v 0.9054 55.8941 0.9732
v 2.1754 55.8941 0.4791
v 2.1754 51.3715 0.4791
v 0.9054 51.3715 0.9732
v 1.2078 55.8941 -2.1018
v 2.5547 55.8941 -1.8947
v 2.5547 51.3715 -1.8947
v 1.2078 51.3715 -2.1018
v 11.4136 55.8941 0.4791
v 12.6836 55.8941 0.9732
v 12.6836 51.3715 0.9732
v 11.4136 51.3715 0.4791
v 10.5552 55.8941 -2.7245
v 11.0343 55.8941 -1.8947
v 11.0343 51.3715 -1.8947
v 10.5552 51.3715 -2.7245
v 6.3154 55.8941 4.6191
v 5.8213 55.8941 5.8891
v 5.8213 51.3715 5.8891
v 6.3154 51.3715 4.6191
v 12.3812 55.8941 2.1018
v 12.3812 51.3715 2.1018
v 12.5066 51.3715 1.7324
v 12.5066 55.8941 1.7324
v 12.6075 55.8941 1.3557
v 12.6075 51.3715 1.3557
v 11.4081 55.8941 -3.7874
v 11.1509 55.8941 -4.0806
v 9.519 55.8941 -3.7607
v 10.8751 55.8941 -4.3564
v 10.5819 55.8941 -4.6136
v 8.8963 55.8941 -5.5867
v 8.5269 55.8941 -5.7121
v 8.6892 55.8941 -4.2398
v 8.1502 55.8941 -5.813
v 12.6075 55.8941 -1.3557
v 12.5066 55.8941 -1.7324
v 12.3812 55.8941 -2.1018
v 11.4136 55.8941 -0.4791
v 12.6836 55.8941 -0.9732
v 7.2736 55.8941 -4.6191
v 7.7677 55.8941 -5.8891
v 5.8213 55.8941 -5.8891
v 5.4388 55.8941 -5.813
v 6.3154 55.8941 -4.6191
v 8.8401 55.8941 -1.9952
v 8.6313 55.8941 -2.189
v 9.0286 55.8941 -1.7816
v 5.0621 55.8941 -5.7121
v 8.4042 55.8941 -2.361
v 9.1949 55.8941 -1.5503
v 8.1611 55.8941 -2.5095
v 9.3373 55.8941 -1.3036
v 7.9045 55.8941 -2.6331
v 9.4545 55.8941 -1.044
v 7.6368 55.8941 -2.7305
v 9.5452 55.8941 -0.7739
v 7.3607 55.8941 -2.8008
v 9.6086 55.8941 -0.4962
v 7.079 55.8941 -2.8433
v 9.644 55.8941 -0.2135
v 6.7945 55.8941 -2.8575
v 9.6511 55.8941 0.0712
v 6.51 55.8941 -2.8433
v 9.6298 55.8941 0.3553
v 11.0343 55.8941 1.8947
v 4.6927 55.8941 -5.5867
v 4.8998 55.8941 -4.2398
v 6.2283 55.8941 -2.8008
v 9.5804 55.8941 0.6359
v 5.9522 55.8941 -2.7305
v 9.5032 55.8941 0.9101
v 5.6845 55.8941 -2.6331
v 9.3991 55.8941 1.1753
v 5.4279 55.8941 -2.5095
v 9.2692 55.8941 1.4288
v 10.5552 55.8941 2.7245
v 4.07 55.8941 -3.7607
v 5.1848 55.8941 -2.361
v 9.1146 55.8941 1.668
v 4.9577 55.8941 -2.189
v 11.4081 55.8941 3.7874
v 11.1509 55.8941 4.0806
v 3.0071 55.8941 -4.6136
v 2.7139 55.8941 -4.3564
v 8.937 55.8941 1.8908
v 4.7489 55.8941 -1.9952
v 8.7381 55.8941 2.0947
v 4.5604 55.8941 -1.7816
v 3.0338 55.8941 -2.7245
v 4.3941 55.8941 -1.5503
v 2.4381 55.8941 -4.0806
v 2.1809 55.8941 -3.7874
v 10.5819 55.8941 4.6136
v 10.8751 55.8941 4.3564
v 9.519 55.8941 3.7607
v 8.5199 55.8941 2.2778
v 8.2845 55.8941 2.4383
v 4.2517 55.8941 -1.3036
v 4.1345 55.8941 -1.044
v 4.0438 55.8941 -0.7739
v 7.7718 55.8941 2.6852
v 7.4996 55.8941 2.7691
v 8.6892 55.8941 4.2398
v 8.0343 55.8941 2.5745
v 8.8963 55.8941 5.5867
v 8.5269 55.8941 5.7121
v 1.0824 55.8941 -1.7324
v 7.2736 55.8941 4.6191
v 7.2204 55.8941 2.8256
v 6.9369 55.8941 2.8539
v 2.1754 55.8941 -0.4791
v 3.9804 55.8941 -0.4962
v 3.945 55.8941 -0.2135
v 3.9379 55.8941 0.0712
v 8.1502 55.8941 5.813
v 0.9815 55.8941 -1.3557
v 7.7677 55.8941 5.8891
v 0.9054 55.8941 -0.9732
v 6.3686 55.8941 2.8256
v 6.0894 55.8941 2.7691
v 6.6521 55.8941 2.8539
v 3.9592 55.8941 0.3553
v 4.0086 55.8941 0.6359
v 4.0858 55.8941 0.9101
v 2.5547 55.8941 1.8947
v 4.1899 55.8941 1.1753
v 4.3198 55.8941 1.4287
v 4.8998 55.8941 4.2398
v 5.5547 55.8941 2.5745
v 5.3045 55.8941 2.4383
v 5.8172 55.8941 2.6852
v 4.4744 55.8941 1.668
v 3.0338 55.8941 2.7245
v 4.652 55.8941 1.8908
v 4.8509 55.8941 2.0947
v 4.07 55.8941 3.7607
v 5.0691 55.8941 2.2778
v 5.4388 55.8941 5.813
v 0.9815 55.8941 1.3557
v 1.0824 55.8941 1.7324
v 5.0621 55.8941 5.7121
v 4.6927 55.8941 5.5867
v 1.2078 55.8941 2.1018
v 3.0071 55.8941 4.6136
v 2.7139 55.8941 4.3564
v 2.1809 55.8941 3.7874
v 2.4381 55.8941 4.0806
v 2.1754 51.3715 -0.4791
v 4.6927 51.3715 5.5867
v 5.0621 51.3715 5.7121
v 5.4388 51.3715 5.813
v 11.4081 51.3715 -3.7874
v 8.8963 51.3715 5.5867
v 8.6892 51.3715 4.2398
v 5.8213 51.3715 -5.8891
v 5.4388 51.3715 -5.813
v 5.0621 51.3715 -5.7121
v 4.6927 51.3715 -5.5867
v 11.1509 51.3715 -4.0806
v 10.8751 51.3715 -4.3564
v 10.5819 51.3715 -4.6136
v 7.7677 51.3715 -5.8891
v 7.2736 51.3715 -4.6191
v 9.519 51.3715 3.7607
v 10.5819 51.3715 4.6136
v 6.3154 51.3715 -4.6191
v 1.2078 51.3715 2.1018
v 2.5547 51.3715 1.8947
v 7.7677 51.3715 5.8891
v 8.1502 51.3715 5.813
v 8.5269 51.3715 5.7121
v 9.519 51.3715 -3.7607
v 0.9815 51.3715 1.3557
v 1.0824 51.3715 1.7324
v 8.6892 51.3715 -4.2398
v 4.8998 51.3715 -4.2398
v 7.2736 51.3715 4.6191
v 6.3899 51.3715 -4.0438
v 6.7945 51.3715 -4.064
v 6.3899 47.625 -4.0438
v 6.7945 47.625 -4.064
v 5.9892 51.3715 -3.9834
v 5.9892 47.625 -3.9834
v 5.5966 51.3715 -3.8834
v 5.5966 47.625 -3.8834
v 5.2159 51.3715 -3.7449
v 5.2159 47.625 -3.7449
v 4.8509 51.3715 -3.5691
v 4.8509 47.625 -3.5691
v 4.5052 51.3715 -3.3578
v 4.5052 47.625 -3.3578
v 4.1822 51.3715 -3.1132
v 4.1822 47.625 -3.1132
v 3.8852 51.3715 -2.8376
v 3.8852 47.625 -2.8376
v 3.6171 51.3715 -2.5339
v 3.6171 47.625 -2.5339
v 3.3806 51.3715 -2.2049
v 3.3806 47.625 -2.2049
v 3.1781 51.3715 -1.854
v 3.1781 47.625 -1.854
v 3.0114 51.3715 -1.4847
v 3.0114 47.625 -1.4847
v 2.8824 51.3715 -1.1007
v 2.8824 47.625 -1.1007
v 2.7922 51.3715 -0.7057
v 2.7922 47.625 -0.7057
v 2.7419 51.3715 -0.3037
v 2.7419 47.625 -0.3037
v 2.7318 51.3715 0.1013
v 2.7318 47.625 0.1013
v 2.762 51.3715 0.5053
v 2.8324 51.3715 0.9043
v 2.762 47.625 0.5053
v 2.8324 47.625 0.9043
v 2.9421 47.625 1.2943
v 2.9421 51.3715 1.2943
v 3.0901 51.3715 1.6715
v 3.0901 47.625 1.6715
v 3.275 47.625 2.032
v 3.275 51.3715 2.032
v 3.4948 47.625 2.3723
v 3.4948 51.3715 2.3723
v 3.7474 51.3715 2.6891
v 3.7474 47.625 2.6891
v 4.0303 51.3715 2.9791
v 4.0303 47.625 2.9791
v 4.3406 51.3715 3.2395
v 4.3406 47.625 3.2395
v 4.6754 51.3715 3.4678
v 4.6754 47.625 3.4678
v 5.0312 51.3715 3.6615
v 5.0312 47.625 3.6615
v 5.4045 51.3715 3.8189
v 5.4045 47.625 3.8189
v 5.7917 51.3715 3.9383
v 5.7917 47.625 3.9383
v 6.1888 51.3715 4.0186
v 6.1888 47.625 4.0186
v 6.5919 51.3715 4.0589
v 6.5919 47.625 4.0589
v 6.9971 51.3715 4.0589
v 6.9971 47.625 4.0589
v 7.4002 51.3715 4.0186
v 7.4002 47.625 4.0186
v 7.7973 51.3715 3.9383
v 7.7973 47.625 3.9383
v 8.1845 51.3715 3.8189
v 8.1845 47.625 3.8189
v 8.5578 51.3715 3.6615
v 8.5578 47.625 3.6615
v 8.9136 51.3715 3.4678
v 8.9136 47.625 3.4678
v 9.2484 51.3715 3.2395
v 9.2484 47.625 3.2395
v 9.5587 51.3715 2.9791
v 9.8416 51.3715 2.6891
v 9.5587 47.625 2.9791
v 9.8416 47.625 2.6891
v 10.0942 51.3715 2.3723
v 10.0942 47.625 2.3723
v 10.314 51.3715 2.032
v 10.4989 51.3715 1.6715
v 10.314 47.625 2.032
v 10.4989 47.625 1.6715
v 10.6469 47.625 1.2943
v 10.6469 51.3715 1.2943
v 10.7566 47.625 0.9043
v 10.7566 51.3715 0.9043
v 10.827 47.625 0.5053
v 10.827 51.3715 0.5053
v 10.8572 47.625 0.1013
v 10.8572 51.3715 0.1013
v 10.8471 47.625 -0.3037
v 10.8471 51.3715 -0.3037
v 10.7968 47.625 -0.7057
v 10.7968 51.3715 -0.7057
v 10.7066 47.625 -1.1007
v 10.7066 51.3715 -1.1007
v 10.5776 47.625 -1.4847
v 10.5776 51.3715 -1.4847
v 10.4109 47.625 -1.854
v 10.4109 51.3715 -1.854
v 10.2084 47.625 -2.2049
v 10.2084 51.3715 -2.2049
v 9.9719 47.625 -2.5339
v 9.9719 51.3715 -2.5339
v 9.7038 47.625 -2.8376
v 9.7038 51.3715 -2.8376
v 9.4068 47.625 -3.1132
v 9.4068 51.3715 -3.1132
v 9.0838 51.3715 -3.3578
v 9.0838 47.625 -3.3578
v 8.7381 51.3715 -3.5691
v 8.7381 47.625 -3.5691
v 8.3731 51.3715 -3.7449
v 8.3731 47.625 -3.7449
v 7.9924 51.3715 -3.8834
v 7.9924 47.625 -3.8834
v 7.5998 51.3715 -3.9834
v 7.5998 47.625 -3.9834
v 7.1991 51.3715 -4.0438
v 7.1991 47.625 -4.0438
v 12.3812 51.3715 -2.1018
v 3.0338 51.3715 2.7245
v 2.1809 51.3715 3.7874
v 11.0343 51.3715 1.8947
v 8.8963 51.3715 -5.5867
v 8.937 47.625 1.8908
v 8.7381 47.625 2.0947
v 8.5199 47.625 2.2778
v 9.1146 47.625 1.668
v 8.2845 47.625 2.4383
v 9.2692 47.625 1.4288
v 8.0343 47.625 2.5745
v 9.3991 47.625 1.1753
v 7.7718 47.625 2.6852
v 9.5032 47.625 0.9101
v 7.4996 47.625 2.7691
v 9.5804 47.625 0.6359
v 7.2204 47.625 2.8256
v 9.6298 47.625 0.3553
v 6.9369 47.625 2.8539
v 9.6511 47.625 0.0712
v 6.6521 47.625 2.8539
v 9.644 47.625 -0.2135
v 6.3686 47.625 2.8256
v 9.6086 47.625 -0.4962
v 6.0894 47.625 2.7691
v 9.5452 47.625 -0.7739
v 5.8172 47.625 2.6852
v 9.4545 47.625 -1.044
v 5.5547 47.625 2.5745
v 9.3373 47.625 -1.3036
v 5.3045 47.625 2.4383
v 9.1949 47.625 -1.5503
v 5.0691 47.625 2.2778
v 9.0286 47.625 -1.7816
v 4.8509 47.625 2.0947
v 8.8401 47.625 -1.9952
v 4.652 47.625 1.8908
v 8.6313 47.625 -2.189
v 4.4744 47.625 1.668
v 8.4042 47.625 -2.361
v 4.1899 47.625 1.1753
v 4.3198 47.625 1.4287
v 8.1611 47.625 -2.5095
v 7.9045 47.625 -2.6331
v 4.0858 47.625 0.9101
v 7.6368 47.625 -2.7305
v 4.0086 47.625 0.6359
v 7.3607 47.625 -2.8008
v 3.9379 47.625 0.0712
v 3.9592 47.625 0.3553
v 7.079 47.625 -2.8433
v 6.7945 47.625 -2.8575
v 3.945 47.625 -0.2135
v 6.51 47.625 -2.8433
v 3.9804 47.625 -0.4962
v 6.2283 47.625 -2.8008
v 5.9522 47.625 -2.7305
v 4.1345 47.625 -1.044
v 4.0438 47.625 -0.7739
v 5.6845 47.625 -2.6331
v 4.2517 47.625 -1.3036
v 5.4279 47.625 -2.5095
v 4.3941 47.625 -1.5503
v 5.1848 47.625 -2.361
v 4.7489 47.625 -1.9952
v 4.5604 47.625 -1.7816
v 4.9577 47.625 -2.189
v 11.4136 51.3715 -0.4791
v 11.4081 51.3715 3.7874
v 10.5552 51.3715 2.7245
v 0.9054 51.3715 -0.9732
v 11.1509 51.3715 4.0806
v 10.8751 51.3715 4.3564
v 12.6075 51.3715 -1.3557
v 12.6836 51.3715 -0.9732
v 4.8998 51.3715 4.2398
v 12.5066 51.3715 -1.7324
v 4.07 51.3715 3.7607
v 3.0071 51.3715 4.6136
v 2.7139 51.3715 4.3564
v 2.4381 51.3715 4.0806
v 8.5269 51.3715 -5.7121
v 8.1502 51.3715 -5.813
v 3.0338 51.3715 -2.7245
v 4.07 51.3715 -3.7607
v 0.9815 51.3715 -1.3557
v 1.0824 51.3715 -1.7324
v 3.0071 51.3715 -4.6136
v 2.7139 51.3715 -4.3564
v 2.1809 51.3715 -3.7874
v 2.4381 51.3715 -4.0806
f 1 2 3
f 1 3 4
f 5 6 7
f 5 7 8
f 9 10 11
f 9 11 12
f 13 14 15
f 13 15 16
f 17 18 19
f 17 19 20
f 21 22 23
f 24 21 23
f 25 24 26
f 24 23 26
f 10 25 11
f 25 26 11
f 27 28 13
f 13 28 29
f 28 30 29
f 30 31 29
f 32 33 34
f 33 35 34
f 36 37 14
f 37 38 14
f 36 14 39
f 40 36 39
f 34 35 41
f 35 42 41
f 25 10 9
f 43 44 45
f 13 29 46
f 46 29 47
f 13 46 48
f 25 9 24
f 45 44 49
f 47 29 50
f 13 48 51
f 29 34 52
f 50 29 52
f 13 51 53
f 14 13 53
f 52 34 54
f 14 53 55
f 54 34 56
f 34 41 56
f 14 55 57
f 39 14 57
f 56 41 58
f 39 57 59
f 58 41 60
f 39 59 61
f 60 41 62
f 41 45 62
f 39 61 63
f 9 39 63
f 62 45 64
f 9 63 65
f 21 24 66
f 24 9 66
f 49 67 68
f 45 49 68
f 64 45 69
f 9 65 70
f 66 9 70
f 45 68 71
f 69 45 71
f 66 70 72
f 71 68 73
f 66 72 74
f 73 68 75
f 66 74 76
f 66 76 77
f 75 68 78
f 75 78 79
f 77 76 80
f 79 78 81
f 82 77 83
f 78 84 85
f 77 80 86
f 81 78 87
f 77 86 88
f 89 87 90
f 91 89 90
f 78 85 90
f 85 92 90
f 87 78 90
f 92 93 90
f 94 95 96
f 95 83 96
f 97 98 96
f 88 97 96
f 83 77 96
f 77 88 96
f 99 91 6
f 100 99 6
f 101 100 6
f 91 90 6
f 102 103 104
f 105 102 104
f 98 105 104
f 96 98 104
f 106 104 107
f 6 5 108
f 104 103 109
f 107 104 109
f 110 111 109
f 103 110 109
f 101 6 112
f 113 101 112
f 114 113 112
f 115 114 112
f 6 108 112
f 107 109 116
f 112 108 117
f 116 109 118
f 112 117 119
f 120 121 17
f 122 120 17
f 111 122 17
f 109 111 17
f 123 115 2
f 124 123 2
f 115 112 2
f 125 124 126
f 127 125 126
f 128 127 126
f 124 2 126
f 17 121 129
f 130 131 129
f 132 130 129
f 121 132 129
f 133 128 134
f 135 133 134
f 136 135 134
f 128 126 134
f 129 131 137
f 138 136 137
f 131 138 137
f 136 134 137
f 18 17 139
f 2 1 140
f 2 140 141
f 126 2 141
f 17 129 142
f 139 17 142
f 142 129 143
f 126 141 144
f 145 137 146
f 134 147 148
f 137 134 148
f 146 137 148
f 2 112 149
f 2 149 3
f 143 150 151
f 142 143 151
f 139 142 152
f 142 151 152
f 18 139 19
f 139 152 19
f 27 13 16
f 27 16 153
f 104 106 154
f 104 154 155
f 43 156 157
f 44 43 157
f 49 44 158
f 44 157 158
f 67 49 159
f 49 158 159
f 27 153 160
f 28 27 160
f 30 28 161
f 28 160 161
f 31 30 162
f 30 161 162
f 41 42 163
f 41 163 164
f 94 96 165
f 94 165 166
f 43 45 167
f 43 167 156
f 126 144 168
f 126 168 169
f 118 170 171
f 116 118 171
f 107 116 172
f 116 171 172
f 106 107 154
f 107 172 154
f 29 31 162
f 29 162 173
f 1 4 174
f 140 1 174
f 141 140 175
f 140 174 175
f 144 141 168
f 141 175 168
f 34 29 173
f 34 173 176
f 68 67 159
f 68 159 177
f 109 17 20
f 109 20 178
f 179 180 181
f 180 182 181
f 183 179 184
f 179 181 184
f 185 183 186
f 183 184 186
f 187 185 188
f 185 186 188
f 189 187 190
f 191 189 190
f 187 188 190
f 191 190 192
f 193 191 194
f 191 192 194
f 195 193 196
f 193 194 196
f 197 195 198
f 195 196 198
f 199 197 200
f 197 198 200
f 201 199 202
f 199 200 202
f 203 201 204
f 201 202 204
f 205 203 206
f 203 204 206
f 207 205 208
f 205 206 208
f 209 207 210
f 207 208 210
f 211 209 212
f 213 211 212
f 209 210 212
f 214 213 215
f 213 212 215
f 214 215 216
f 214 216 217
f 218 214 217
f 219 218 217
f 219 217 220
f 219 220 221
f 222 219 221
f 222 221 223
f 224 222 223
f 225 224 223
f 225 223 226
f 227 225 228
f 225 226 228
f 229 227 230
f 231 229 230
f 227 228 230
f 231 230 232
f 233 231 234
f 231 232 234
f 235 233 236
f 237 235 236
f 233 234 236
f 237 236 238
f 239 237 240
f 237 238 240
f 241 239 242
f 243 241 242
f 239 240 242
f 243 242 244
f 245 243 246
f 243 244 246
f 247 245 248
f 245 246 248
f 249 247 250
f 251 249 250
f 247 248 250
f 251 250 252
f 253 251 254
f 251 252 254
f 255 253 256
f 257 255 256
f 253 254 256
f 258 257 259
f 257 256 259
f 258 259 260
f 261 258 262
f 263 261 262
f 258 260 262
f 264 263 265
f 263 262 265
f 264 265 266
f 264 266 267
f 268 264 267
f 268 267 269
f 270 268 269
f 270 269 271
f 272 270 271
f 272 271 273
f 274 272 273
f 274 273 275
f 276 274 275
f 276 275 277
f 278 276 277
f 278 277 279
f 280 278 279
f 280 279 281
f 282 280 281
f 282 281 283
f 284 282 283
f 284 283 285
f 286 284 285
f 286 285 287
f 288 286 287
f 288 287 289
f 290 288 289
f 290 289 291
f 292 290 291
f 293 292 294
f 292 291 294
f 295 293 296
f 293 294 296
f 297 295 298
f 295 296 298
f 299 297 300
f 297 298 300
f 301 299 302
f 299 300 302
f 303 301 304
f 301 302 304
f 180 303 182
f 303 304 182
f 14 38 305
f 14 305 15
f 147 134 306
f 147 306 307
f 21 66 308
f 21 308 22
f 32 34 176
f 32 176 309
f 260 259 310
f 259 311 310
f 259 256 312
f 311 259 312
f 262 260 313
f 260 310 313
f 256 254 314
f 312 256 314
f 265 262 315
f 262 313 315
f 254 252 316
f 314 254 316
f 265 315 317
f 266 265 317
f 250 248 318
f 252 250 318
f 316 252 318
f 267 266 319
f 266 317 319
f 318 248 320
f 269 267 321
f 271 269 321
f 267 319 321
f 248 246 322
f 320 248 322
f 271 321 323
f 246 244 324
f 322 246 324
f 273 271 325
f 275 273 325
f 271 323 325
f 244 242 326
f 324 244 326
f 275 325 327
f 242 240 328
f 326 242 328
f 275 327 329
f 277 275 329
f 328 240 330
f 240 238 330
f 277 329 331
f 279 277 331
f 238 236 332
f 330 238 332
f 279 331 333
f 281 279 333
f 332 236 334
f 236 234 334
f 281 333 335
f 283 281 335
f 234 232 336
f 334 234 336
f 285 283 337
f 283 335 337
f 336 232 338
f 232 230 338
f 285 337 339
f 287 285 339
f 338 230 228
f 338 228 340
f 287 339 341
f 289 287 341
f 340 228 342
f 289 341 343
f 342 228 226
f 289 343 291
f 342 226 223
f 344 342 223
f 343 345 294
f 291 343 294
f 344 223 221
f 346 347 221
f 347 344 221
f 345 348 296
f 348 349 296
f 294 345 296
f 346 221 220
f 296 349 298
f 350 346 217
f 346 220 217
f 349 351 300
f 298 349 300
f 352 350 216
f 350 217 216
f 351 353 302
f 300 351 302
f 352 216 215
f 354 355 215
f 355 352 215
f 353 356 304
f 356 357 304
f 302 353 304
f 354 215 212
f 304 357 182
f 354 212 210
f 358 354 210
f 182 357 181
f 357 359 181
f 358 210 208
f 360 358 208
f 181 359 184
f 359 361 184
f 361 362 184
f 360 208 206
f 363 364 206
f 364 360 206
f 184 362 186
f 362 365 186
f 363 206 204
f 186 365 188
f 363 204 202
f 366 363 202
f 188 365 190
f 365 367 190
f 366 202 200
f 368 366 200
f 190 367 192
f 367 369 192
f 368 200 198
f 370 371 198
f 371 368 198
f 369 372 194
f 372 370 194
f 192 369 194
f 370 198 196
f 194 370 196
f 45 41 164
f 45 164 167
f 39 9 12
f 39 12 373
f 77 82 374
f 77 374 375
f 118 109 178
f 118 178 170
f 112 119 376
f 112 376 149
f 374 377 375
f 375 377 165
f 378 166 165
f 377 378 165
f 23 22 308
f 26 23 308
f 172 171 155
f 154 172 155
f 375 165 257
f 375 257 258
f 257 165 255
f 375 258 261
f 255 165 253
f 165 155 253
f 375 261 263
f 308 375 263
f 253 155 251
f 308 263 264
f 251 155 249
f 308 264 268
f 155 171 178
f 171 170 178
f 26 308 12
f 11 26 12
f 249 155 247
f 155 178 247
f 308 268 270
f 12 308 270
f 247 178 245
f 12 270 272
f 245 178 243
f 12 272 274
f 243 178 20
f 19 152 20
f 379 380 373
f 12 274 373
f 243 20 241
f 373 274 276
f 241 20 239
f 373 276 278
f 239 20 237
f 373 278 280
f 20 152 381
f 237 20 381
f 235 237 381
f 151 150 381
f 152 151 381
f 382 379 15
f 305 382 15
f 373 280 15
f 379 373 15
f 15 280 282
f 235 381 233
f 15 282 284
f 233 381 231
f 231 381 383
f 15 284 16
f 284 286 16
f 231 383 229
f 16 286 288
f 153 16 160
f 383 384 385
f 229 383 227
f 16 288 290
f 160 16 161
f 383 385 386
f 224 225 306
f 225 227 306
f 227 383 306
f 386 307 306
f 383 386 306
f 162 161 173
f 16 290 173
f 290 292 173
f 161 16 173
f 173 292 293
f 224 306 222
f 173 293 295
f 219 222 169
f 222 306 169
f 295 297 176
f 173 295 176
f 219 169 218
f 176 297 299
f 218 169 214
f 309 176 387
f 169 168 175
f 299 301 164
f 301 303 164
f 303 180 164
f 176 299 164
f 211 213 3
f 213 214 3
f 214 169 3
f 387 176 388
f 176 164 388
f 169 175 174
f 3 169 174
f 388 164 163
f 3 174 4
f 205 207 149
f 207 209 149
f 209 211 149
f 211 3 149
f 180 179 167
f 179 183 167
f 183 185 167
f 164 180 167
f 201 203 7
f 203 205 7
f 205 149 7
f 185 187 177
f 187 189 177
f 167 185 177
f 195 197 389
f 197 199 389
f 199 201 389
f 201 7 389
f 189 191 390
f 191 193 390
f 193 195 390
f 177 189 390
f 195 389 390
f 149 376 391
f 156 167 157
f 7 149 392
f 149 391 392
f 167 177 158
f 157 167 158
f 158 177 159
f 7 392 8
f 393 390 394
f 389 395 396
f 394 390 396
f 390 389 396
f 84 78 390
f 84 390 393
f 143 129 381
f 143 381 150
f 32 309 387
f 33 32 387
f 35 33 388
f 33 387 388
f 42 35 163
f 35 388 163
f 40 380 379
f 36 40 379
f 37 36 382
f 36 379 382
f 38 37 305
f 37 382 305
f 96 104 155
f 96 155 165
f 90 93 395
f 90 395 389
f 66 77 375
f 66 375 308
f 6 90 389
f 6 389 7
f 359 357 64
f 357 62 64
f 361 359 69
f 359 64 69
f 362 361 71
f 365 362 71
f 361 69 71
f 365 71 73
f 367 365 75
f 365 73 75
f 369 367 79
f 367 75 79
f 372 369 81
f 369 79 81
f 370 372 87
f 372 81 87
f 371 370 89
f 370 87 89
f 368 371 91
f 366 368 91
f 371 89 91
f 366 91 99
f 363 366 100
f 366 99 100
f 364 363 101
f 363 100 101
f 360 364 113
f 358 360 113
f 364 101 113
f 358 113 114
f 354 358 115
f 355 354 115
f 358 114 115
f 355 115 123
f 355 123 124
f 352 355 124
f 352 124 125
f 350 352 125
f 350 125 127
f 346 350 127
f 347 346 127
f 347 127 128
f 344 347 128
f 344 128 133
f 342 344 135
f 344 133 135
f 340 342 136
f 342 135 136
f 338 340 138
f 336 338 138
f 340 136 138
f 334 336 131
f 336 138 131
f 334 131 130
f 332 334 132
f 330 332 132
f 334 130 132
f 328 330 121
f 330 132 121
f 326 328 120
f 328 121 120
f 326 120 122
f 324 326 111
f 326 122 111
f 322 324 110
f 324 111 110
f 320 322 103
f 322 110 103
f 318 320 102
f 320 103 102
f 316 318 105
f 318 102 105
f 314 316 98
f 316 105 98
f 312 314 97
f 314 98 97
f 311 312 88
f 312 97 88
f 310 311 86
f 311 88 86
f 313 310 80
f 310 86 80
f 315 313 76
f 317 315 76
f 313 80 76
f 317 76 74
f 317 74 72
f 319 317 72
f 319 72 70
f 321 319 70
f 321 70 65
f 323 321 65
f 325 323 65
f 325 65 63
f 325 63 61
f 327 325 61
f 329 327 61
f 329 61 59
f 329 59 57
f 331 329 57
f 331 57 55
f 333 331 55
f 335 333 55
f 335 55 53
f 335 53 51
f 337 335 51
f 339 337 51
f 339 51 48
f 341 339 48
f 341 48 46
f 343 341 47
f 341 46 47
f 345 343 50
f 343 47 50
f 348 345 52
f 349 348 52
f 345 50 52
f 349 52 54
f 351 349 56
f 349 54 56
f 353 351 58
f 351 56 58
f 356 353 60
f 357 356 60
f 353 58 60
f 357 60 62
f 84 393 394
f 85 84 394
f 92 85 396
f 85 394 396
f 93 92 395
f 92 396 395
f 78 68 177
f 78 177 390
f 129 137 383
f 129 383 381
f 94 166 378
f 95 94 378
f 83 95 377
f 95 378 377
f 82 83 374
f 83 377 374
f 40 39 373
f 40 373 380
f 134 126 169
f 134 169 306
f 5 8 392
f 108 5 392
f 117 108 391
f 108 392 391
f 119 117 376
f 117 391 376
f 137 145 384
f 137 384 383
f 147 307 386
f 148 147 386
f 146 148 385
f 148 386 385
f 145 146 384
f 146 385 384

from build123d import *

# Parameters (mm, degrees)
CUT_EXTRUDE2_REACH = 19.55
CIRPATTERN1_COUNT  = 12


with BuildPart() as part:
    # Sketch1 → Revolve1 (revolve)
    with BuildSketch(Plane.XY, mode=Mode.PRIVATE) as revolve1_sk:
        Polygon((3.937, 47.625), (3.937, 55.894079216), (0.8255, 55.894079216), (0.8255, 51.371485268), (2.7305, 51.371485268), (2.7305, 47.625), align=None)
    revolve(revolve1_sk.sketch.rotate(Axis((6.7945, 45.4025, 0), (0, 1, 0)), 270), axis=Axis((6.7945, 45.4025, 0), (0, 1, 0)))

    # Sketch2 → Cut-Extrude2 (cut, up to next)
    with BuildSketch(Plane(origin=(-1.519613368, 55.894079216, 0), x_dir=(-1, 0, 0), z_dir=(0, 1, 0)), mode=Mode.PRIVATE) as cut_extrude2_sk1:
        with BuildLine():
            Line((-3.694980373, 0.479092135), (-2.424980373, 0.973177048))
            ThreePointArc((-2.424980373, 0.973177048), (-2.345113368, 0), (-2.424980373, -0.973177048))
            Line((-2.424980373, -0.973177048), (-3.694980373, -0.479092135))
            Line((-3.694980373, -0.479092135), (-3.694980373, 0.479092135))
        make_face()
    cut_extrude2_tool1 = extrude(cut_extrude2_sk1.sketch, amount=-CUT_EXTRUDE2_REACH, mode=Mode.PRIVATE) & part.part
    cut_extrude2 = cut_extrude2_tool1.solids().sort_by_distance((1.436663, 55.894079, 0))[0]
    add(cut_extrude2, mode=Mode.SUBTRACT)

    # CirPattern1: Cut-Extrude2 ×12 about axis
    cirpattern1_axis = Axis((6.7945, 0, 0), (0, 1, 0))
    for i in range(1, CIRPATTERN1_COUNT):
        add(cut_extrude2.rotate(cirpattern1_axis, i * 360 / CIRPATTERN1_COUNT), mode=Mode.SUBTRACT)


solid = part.part
